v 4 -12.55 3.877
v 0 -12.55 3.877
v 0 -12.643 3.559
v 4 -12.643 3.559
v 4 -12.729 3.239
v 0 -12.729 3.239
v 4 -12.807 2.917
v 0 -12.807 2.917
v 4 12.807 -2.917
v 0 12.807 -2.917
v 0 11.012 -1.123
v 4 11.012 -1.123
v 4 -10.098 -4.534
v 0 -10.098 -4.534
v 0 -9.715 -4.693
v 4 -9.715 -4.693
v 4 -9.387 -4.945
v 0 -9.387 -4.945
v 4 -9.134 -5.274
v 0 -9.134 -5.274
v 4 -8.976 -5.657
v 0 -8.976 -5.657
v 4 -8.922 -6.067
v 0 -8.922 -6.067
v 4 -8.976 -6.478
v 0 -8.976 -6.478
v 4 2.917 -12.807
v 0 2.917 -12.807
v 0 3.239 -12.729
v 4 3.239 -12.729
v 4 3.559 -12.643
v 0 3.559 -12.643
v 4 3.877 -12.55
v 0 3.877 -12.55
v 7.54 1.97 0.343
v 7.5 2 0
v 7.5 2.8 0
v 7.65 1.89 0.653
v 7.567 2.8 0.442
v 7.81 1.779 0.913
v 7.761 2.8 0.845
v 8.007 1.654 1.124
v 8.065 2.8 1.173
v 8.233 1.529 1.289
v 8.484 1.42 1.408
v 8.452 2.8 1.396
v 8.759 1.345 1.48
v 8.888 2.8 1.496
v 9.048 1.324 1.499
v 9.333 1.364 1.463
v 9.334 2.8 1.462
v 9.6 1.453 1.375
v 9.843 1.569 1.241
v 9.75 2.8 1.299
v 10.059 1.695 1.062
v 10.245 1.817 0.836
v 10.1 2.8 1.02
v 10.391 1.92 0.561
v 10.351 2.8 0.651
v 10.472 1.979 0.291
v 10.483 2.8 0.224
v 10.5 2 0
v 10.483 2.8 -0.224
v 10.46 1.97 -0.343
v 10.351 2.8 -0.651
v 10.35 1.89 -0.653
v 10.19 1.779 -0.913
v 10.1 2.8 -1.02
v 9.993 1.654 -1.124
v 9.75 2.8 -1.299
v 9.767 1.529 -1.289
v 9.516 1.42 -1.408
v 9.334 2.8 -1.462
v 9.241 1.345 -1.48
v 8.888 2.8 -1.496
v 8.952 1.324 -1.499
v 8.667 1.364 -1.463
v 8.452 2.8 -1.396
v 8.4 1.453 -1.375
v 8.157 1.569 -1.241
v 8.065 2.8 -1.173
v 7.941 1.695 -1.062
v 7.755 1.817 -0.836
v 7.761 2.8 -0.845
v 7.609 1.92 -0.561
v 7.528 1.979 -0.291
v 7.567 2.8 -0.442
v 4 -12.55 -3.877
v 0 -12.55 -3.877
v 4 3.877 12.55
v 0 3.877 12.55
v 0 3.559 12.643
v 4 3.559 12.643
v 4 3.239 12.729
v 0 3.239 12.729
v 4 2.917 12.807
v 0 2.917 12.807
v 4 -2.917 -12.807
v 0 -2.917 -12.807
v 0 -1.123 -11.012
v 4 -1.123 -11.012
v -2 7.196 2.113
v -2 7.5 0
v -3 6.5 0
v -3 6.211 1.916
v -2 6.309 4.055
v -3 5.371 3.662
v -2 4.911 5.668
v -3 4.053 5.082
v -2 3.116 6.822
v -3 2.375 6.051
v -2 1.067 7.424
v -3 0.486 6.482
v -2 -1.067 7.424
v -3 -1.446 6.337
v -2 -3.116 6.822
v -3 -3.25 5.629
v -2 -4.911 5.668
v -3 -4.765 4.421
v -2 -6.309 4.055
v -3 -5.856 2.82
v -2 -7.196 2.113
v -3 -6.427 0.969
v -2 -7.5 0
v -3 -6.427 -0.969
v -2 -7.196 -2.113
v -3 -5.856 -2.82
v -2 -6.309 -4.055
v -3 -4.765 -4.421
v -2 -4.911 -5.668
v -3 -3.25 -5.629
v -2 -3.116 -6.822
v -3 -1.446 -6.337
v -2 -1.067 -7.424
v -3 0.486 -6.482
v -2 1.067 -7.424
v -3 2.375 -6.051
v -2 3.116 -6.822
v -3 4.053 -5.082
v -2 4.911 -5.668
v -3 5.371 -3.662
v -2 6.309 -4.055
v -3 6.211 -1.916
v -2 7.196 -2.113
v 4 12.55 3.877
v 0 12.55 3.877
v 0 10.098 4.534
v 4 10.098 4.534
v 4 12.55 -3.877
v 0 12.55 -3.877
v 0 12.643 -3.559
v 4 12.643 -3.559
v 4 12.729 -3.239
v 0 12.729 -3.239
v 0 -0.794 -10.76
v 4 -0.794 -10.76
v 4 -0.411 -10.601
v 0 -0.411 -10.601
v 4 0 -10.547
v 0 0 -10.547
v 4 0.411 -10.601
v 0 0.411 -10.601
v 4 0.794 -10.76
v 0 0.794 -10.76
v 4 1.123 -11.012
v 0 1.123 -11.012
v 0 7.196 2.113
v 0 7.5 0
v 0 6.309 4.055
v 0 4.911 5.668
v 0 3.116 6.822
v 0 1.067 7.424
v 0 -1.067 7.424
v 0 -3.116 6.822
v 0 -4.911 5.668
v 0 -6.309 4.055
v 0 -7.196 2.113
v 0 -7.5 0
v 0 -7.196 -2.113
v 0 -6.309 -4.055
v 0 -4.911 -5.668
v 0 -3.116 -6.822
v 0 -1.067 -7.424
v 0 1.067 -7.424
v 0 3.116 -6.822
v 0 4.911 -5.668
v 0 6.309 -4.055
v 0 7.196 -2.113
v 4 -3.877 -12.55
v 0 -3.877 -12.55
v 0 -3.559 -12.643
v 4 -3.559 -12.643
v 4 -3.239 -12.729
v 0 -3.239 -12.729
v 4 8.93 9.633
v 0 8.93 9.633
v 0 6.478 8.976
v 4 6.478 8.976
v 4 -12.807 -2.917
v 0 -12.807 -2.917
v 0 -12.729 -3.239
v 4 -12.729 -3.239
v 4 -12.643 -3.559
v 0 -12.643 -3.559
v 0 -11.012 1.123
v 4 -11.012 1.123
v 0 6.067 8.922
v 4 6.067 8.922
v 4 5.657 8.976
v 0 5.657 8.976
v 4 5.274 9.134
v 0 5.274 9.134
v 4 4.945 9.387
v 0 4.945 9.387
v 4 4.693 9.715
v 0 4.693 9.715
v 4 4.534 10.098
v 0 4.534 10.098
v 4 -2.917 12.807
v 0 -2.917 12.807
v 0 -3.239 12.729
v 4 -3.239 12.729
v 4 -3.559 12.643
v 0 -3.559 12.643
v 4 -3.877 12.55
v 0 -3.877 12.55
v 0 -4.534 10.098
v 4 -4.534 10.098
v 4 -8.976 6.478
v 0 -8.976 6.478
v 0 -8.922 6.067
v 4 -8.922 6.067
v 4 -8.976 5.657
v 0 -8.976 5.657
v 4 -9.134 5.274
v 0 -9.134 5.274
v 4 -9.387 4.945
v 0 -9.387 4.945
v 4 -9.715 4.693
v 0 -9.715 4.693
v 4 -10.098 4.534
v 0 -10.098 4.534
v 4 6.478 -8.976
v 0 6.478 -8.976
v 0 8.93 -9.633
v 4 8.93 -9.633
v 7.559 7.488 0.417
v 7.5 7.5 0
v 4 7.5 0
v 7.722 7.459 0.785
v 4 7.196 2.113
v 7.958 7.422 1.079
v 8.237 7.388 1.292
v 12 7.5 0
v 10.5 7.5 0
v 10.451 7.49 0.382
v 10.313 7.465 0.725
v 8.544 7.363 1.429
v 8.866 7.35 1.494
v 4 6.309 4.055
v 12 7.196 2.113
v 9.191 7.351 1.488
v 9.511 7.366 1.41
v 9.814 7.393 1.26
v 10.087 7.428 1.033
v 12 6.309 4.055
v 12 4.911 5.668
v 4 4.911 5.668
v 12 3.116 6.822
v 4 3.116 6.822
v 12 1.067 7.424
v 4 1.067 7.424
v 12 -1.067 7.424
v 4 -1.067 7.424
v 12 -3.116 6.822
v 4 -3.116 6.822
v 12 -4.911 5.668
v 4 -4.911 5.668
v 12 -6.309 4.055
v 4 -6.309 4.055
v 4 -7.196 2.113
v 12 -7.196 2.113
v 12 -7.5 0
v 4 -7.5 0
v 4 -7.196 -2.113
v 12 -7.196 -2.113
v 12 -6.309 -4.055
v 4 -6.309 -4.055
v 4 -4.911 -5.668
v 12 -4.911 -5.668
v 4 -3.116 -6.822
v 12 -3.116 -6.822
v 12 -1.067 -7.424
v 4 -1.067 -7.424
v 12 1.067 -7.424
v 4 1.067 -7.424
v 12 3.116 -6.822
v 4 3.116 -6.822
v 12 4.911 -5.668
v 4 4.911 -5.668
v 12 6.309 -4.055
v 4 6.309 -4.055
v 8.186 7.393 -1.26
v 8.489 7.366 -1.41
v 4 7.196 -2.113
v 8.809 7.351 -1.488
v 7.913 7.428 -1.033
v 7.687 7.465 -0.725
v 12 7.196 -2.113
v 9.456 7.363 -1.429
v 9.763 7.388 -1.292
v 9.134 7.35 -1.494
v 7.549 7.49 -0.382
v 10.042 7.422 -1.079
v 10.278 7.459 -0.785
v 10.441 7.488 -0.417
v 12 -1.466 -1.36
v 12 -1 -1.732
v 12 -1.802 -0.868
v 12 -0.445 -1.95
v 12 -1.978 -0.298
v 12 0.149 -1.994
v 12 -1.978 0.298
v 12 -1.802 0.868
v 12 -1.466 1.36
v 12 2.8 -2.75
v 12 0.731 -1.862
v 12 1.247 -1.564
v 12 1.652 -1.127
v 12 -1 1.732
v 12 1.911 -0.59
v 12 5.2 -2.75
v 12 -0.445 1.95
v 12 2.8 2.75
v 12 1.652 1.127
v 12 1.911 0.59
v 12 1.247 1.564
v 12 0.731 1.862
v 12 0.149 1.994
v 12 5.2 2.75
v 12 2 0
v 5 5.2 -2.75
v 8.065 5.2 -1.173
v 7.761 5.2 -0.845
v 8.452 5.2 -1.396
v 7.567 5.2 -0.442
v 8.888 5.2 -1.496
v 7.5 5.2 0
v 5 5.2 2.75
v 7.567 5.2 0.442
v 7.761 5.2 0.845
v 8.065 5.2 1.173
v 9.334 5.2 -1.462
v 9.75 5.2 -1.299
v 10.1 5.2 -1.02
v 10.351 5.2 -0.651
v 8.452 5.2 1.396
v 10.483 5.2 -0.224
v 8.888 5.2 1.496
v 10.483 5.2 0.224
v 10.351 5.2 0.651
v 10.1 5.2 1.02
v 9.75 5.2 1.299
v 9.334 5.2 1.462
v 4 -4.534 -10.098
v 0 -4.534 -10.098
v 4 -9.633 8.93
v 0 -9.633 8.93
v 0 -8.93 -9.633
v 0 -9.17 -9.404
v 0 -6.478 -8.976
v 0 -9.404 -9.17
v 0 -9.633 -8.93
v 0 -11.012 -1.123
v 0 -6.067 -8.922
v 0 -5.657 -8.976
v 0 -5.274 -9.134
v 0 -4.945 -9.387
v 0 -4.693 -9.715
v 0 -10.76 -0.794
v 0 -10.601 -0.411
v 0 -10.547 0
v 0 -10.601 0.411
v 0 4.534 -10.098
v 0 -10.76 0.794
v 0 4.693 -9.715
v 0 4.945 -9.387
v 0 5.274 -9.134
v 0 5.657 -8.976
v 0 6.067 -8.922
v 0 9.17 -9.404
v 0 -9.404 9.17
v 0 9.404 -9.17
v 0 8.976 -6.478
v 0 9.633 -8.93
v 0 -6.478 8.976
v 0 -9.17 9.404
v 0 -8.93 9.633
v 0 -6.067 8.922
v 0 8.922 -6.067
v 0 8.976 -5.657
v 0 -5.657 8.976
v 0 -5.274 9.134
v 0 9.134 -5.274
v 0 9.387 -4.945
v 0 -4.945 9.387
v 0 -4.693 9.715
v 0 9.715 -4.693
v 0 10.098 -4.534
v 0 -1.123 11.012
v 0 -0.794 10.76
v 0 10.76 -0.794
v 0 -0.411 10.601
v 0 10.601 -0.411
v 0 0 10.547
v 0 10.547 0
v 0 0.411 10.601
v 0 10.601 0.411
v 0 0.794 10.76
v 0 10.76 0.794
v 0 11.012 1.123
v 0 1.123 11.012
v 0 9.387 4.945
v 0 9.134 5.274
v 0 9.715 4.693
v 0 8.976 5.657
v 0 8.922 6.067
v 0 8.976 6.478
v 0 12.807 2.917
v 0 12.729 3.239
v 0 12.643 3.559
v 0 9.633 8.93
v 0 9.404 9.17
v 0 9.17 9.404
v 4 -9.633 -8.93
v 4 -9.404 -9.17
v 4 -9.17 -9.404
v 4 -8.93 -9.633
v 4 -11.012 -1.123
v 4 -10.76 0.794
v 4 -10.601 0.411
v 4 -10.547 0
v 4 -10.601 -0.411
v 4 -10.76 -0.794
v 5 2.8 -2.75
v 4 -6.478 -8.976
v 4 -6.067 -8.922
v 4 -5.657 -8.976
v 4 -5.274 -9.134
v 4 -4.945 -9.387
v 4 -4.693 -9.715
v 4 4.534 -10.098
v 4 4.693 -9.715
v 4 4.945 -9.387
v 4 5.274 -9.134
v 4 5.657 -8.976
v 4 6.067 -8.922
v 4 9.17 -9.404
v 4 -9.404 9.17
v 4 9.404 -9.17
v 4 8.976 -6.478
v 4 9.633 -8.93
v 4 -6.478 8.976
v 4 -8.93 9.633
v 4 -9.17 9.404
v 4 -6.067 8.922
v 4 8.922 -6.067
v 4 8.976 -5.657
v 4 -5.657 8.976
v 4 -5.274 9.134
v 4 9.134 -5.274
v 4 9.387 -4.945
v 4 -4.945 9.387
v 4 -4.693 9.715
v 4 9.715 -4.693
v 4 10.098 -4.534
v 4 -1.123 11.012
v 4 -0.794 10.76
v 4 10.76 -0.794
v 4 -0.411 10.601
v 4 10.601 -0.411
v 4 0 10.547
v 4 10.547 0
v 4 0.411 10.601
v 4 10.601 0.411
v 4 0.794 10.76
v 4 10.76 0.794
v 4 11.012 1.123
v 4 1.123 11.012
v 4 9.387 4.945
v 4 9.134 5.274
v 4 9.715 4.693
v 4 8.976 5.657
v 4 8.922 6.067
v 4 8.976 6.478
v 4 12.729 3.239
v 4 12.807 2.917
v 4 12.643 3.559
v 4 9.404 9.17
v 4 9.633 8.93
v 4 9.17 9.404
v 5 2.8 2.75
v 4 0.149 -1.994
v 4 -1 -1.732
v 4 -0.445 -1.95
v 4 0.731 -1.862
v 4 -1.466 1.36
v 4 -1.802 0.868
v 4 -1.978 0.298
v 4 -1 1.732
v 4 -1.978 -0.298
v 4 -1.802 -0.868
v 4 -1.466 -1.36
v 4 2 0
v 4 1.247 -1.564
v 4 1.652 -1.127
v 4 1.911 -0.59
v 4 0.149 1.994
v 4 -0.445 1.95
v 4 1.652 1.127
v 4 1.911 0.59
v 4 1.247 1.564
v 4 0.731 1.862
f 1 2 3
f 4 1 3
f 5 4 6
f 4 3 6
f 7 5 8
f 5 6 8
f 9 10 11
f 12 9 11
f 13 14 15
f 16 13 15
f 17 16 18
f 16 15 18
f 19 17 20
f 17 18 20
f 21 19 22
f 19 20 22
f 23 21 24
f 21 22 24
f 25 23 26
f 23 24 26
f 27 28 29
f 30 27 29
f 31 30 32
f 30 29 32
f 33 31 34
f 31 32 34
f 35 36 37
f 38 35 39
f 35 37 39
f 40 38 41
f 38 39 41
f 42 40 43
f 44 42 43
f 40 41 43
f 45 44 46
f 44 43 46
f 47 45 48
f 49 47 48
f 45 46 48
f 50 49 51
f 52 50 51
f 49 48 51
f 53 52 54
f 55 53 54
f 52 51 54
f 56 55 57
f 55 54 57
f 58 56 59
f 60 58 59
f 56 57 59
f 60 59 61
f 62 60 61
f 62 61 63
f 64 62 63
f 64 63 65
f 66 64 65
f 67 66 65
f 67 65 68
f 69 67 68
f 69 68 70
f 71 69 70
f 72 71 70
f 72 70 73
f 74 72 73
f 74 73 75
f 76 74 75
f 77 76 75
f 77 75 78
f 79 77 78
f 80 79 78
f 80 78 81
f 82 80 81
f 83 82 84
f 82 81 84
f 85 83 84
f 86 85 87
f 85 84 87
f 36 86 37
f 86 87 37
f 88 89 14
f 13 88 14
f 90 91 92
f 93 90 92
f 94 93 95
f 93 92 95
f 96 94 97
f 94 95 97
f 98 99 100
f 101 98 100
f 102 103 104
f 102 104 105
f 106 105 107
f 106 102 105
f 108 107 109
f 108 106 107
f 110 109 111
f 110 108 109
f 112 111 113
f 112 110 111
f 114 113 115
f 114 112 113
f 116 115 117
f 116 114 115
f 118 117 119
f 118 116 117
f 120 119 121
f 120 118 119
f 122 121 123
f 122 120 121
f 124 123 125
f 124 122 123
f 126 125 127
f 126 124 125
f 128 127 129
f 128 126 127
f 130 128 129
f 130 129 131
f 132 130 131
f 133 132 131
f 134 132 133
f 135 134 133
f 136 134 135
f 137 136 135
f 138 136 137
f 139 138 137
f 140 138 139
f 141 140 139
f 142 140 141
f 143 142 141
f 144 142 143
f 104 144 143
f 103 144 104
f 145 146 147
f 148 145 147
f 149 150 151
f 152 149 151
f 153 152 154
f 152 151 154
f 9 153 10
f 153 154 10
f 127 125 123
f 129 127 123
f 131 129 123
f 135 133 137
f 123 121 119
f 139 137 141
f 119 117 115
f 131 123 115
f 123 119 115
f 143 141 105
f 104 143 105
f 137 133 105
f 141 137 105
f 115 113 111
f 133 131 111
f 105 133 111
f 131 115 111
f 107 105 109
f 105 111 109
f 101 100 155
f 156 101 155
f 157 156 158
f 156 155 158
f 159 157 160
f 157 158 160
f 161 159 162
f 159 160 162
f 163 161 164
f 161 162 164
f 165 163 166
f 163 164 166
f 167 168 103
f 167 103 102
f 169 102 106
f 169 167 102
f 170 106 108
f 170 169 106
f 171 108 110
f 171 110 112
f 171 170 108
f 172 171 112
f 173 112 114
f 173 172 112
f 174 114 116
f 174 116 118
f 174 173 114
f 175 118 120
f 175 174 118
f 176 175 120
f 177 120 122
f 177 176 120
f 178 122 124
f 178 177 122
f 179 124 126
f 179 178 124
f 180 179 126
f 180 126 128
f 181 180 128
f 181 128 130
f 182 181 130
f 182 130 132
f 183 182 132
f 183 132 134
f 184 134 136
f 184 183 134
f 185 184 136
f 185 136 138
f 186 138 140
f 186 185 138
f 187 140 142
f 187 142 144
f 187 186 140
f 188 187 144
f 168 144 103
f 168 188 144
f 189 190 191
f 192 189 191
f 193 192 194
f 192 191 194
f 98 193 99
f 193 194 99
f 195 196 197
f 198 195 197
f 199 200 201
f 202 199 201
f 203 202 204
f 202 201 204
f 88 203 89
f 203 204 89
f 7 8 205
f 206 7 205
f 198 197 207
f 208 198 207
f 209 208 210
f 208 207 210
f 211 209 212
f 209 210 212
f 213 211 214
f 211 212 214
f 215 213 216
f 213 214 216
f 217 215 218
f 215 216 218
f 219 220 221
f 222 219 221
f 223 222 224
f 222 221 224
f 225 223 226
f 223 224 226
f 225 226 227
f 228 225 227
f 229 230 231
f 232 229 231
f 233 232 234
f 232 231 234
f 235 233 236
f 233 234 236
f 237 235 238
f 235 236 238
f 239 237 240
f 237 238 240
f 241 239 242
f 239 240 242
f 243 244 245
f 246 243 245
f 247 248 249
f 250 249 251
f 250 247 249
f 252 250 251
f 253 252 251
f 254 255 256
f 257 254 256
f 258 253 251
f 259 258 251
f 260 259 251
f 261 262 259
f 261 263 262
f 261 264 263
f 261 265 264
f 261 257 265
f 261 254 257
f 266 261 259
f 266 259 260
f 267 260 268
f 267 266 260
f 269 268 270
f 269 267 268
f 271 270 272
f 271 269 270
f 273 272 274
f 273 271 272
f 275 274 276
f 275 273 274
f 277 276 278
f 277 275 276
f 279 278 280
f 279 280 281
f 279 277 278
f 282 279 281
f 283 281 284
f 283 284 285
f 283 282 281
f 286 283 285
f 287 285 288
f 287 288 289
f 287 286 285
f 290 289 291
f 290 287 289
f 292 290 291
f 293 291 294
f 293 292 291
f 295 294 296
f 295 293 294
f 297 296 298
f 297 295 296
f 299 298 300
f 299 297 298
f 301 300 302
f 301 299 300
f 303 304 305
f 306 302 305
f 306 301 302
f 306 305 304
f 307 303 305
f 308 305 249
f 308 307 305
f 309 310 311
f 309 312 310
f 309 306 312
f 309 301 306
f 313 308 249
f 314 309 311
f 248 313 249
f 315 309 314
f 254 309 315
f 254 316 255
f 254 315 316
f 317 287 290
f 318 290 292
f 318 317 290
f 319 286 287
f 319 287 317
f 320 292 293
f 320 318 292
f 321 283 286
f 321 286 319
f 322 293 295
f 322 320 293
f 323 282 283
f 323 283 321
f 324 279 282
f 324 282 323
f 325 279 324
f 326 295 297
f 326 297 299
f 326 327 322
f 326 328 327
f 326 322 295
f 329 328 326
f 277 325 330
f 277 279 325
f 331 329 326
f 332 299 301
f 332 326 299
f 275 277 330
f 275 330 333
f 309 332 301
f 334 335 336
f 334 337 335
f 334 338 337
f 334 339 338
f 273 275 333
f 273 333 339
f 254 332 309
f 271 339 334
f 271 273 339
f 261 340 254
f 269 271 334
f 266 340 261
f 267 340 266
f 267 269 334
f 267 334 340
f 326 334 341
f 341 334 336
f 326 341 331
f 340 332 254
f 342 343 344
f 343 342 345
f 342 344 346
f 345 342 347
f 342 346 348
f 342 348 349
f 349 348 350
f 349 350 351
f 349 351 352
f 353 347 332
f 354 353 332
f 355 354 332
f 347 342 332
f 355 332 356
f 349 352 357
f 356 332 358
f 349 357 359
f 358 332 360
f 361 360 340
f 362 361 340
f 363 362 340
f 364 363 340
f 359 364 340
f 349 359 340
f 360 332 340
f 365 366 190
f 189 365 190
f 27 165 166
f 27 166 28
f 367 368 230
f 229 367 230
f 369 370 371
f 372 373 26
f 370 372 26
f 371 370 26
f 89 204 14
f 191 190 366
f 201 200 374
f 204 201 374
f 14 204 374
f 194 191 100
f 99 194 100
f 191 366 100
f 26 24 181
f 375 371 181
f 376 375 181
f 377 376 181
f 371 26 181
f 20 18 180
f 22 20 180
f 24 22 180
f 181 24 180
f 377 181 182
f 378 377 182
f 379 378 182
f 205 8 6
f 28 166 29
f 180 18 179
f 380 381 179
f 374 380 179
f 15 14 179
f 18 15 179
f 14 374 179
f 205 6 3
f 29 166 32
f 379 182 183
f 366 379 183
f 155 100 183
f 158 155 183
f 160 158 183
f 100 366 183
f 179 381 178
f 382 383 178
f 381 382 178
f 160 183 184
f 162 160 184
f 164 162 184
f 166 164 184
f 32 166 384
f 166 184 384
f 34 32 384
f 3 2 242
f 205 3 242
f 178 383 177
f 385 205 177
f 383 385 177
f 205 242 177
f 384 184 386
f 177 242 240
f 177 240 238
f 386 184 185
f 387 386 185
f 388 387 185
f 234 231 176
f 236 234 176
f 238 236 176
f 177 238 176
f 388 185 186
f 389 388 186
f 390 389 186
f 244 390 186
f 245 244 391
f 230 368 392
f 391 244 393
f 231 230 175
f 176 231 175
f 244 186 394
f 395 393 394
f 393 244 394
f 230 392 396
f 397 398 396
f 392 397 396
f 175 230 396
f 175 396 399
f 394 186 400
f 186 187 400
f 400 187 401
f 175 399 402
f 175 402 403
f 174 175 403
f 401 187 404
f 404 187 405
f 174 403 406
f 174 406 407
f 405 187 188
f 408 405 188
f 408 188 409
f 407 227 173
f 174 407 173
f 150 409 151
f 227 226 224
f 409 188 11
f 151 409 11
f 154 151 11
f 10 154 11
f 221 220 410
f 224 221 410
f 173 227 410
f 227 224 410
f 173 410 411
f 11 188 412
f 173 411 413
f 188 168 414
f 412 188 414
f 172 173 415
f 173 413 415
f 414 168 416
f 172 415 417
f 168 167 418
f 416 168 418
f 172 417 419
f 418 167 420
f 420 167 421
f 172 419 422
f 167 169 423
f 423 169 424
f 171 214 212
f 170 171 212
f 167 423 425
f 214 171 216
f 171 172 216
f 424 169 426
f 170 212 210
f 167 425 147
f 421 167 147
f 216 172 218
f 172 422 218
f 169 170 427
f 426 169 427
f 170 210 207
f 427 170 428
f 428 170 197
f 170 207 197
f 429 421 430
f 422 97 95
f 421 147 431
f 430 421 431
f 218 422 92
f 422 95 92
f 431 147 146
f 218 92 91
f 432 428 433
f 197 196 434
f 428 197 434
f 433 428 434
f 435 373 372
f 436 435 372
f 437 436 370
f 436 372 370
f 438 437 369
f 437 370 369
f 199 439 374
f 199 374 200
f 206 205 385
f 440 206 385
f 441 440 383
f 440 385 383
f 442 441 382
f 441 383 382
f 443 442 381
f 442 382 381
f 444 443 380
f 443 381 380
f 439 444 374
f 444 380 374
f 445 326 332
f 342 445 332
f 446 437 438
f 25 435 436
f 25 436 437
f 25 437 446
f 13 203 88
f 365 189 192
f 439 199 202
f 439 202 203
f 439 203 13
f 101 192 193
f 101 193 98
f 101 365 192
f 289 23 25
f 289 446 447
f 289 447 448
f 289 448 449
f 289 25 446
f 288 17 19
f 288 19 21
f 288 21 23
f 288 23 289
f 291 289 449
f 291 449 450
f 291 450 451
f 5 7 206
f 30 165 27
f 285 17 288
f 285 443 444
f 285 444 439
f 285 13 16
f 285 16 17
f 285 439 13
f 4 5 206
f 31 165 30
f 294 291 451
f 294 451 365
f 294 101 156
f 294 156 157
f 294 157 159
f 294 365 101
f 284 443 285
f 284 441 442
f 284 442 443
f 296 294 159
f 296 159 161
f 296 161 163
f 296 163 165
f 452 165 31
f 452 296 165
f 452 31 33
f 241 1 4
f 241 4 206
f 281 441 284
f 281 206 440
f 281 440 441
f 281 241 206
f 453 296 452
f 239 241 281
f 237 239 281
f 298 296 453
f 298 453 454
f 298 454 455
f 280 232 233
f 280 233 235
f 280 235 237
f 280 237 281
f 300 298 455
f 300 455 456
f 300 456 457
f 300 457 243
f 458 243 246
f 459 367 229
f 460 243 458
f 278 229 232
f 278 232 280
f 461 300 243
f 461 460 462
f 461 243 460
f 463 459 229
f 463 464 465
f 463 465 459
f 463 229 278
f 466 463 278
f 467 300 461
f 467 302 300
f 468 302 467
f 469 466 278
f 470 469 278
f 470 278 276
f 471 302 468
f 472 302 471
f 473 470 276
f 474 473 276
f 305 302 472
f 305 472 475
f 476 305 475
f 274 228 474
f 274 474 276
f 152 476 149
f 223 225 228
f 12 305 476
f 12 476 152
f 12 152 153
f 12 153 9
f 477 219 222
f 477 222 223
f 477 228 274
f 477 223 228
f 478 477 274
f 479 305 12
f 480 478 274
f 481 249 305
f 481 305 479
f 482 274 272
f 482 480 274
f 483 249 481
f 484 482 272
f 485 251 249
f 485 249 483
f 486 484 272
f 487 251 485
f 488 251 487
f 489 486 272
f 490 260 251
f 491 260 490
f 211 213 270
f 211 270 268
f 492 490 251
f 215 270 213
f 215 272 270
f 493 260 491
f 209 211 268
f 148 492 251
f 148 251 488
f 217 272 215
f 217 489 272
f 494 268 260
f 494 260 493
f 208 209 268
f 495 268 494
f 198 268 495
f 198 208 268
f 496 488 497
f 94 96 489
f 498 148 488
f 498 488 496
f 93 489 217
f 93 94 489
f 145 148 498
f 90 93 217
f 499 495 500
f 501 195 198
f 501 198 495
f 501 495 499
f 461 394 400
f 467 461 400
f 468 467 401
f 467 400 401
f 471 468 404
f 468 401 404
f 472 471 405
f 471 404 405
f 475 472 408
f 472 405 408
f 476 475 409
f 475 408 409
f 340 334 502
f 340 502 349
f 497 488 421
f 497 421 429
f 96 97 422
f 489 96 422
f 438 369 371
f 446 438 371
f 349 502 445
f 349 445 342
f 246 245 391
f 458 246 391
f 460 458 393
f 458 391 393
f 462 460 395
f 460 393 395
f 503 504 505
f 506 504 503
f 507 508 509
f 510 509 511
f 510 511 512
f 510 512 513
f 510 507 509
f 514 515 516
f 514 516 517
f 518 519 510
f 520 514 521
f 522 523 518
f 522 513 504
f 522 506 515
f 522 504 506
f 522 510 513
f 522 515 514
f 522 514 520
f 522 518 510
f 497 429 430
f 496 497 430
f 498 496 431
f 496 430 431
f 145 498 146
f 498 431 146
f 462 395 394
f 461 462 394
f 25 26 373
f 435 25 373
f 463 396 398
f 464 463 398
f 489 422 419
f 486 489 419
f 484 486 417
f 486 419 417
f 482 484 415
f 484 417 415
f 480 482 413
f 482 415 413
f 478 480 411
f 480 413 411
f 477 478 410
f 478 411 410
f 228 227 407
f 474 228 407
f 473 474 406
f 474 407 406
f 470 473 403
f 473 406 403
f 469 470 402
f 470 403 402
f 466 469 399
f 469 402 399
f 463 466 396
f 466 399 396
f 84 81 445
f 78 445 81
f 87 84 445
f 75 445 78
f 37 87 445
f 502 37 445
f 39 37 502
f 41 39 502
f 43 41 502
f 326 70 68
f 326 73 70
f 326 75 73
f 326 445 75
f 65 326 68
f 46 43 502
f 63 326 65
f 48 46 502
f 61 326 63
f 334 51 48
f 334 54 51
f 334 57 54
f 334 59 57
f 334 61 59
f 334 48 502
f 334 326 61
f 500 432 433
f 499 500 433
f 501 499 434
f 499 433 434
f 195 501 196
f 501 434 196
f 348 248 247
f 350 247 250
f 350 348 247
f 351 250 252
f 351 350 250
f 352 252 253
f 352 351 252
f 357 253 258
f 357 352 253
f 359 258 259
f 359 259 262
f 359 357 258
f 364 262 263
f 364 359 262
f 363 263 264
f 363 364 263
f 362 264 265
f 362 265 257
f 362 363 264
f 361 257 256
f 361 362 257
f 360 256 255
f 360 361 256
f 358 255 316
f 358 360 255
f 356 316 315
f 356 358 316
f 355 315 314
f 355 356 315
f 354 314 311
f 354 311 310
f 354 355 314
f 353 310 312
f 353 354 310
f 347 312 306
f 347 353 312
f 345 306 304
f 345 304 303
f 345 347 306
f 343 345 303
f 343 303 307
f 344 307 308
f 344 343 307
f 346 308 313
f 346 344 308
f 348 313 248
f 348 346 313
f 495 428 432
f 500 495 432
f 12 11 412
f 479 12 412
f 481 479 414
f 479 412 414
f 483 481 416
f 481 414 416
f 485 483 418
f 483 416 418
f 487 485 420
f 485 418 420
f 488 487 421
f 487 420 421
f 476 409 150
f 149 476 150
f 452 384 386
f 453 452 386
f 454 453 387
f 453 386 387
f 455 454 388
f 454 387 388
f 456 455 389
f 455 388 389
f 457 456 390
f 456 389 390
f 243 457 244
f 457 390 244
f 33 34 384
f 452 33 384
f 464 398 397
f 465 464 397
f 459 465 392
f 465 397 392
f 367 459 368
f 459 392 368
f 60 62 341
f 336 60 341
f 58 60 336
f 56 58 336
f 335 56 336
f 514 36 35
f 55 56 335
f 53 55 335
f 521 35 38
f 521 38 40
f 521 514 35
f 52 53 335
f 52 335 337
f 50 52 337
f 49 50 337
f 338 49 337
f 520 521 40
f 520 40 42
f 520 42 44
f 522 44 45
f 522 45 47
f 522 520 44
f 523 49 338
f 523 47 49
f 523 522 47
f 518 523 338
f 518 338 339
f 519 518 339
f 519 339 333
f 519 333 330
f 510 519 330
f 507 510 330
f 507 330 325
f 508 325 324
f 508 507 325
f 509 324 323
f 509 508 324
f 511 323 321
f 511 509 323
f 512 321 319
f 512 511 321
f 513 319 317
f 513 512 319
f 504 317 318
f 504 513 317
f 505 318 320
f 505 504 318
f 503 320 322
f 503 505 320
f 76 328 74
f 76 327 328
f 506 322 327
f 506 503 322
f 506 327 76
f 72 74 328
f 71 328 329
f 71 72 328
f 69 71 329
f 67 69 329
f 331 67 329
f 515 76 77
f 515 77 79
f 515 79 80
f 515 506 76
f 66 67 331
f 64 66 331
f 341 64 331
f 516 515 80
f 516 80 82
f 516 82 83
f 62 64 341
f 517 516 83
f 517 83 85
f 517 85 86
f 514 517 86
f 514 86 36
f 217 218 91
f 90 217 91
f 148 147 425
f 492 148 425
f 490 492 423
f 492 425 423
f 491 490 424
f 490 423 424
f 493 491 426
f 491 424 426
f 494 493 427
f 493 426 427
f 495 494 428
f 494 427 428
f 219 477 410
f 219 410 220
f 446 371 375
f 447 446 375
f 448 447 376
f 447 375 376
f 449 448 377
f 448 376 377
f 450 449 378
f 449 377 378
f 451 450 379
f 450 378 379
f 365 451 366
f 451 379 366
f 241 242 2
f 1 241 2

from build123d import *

# Parameters (mm, degrees)
F0_R          = 7.5
F0_R_2        = 2
F1_DEPTH      = 12
F1_DEPTH_BACK = 3
F2_DEPTH      = 4
F3_DEPTH      = 3
F4_SIZE       = 1
F5_W          = 2.4
F5_H          = 5.5
F6_DEPTH      = 7
F7_R          = 1.5
F8_DEPTH      = 10.0078377589
F8_DEPTH_BACK = 1.4781244445


with BuildPart() as f1:
    # F0 (on Right) → F1 (new body, two sides)
    with BuildSketch(Plane.YZ) as f1_sk:
        Circle(F0_R)
        Circle(F0_R_2, mode=Mode.SUBTRACT)
    extrude(amount=F1_DEPTH)
    extrude(f1_sk.sketch, amount=-F1_DEPTH_BACK)

    # F0 (on Right) → F2 (join)
    with BuildSketch(Plane.YZ):
        with BuildLine():
            Line((-1.1225320151, 11.0123179849), (-2.9170517891, 12.8068377589))
            ThreePointArc((-2.9170517891, 12.8068377589), (-3.3995493346, 12.6872908394), (-3.8771779259, 12.5495727359))
            Line((-3.8771779259, 12.5495727359), (-4.5340177508, 10.098213137))
            ThreePointArc((-4.5340177508, 10.098213137), (-5.273675, 9.1342730426), (-6.4783002341, 8.9756811219))
            Line((-6.4783002341, 8.9756811219), (-8.929659833, 9.6325209468))
            ThreePointArc((-8.929659833, 9.6325209468), (-9.2877415049, 9.2877415049), (-9.6325209468, 8.929659833))
            Line((-9.6325209468, 8.929659833), (-8.9756811219, 6.4783002341))
            ThreePointArc((-8.9756811219, 6.4783002341), (-9.1342730426, 5.273675), (-10.098213137, 4.5340177508))
            Line((-10.098213137, 4.5340177508), (-12.5495727359, 3.8771779259))
            ThreePointArc((-12.5495727359, 3.8771779259), (-12.6872908394, 3.3995493346), (-12.8068377589, 2.9170517891))
            Line((-12.8068377589, 2.9170517891), (-11.0123179849, 1.1225320151))
            ThreePointArc((-11.0123179849, 1.1225320151), (-10.54735, 0), (-11.0123179849, -1.1225320151))
            Line((-11.0123179849, -1.1225320151), (-12.8068377589, -2.9170517891))
            ThreePointArc((-12.8068377589, -2.9170517891), (-12.6872908394, -3.3995493346), (-12.5495727359, -3.8771779259))
            Line((-12.5495727359, -3.8771779259), (-10.098213137, -4.5340177508))
            ThreePointArc((-10.098213137, -4.5340177508), (-9.1342730426, -5.273675), (-8.9756811219, -6.4783002341))
            Line((-8.9756811219, -6.4783002341), (-9.6325209468, -8.929659833))
            ThreePointArc((-9.6325209468, -8.929659833), (-9.2877415049, -9.2877415049), (-8.929659833, -9.6325209468))
            Line((-8.929659833, -9.6325209468), (-6.4783002341, -8.9756811219))
            ThreePointArc((-6.4783002341, -8.9756811219), (-5.273675, -9.1342730426), (-4.5340177508, -10.098213137))
            Line((-4.5340177508, -10.098213137), (-3.8771779259, -12.5495727359))
            ThreePointArc((-3.8771779259, -12.5495727359), (-3.3995493346, -12.6872908394), (-2.9170517891, -12.8068377589))
            Line((-2.9170517891, -12.8068377589), (-1.1225320151, -11.0123179849))
            ThreePointArc((-1.1225320151, -11.0123179849), (0, -10.54735), (1.1225320151, -11.0123179849))
            Line((1.1225320151, -11.0123179849), (2.9170517891, -12.8068377589))
            ThreePointArc((2.9170517891, -12.8068377589), (3.3995493346, -12.6872908394), (3.8771779259, -12.5495727359))
            Line((3.8771779259, -12.5495727359), (4.5340177508, -10.098213137))
            ThreePointArc((4.5340177508, -10.098213137), (5.273675, -9.1342730426), (6.4783002341, -8.9756811219))
            Line((6.4783002341, -8.9756811219), (8.929659833, -9.6325209468))
            ThreePointArc((8.929659833, -9.6325209468), (9.2877415049, -9.2877415049), (9.6325209468, -8.929659833))
            Line((9.6325209468, -8.929659833), (8.9756811219, -6.4783002341))
            ThreePointArc((8.9756811219, -6.4783002341), (9.1342730426, -5.273675), (10.098213137, -4.5340177508))
            Line((10.098213137, -4.5340177508), (12.5495727359, -3.8771779259))
            ThreePointArc((12.5495727359, -3.8771779259), (12.6872908394, -3.3995493346), (12.8068377589, -2.9170517891))
            Line((12.8068377589, -2.9170517891), (11.0123179849, -1.1225320151))
            ThreePointArc((11.0123179849, -1.1225320151), (10.54735, 0), (11.0123179849, 1.1225320151))
            Line((11.0123179849, 1.1225320151), (12.8068377589, 2.9170517891))
            ThreePointArc((12.8068377589, 2.9170517891), (12.6872908394, 3.3995493346), (12.5495727359, 3.8771779259))
            Line((12.5495727359, 3.8771779259), (10.098213137, 4.5340177508))
            ThreePointArc((10.098213137, 4.5340177508), (9.1342730426, 5.273675), (8.9756811219, 6.4783002341))
            Line((8.9756811219, 6.4783002341), (9.6325209468, 8.929659833))
            ThreePointArc((9.6325209468, 8.929659833), (9.2877415049, 9.2877415049), (8.929659833, 9.6325209468))
            Line((8.929659833, 9.6325209468), (6.4783002341, 8.9756811219))
            ThreePointArc((6.4783002341, 8.9756811219), (5.273675, 9.1342730426), (4.5340177508, 10.098213137))
            Line((4.5340177508, 10.098213137), (3.8771779259, 12.5495727359))
            ThreePointArc((3.8771779259, 12.5495727359), (3.3995493346, 12.6872908394), (2.9170517891, 12.8068377589))
            Line((2.9170517891, 12.8068377589), (1.1225320151, 11.0123179849))
            ThreePointArc((1.1225320151, 11.0123179849), (0, 10.54735), (-1.1225320151, 11.0123179849))
        make_face()
        Circle(F0_R, mode=Mode.SUBTRACT)
        Circle(F0_R_2)
    extrude(amount=F2_DEPTH)

    # F3 (add): a face of the model
    f3_faces = [f1.faces().sort_by_distance(p)[0] for p in [
        (0, 0, 0),
    ]]
    extrude(f3_faces, amount=F3_DEPTH)

    # F4
    f4_edges = [f1.edges().sort_by_distance(p)[0] for p in [
        (-3, -7.5, 0),
    ]]
    chamfer(f4_edges, length=F4_SIZE)

    # F5 (on face) → F6 (cut)
    with BuildSketch(Plane.YZ.offset(12)):
        with Locations((4, 0)):
            Rectangle(F5_W, F5_H)
    extrude(amount=-F6_DEPTH, mode=Mode.SUBTRACT)

    # F7 (on face) → F8 (cut, two sides)
    with BuildSketch(Plane(origin=(0, 2.8, 0), x_dir=(-1, 0, 0), z_dir=(0, 1, 0))) as f8_sk:
        with Locations((-9, 0)):
            Circle(F7_R)
    extrude(amount=F8_DEPTH, mode=Mode.SUBTRACT)
    extrude(f8_sk.sketch, amount=-F8_DEPTH_BACK, mode=Mode.SUBTRACT)


solid = f1.part
